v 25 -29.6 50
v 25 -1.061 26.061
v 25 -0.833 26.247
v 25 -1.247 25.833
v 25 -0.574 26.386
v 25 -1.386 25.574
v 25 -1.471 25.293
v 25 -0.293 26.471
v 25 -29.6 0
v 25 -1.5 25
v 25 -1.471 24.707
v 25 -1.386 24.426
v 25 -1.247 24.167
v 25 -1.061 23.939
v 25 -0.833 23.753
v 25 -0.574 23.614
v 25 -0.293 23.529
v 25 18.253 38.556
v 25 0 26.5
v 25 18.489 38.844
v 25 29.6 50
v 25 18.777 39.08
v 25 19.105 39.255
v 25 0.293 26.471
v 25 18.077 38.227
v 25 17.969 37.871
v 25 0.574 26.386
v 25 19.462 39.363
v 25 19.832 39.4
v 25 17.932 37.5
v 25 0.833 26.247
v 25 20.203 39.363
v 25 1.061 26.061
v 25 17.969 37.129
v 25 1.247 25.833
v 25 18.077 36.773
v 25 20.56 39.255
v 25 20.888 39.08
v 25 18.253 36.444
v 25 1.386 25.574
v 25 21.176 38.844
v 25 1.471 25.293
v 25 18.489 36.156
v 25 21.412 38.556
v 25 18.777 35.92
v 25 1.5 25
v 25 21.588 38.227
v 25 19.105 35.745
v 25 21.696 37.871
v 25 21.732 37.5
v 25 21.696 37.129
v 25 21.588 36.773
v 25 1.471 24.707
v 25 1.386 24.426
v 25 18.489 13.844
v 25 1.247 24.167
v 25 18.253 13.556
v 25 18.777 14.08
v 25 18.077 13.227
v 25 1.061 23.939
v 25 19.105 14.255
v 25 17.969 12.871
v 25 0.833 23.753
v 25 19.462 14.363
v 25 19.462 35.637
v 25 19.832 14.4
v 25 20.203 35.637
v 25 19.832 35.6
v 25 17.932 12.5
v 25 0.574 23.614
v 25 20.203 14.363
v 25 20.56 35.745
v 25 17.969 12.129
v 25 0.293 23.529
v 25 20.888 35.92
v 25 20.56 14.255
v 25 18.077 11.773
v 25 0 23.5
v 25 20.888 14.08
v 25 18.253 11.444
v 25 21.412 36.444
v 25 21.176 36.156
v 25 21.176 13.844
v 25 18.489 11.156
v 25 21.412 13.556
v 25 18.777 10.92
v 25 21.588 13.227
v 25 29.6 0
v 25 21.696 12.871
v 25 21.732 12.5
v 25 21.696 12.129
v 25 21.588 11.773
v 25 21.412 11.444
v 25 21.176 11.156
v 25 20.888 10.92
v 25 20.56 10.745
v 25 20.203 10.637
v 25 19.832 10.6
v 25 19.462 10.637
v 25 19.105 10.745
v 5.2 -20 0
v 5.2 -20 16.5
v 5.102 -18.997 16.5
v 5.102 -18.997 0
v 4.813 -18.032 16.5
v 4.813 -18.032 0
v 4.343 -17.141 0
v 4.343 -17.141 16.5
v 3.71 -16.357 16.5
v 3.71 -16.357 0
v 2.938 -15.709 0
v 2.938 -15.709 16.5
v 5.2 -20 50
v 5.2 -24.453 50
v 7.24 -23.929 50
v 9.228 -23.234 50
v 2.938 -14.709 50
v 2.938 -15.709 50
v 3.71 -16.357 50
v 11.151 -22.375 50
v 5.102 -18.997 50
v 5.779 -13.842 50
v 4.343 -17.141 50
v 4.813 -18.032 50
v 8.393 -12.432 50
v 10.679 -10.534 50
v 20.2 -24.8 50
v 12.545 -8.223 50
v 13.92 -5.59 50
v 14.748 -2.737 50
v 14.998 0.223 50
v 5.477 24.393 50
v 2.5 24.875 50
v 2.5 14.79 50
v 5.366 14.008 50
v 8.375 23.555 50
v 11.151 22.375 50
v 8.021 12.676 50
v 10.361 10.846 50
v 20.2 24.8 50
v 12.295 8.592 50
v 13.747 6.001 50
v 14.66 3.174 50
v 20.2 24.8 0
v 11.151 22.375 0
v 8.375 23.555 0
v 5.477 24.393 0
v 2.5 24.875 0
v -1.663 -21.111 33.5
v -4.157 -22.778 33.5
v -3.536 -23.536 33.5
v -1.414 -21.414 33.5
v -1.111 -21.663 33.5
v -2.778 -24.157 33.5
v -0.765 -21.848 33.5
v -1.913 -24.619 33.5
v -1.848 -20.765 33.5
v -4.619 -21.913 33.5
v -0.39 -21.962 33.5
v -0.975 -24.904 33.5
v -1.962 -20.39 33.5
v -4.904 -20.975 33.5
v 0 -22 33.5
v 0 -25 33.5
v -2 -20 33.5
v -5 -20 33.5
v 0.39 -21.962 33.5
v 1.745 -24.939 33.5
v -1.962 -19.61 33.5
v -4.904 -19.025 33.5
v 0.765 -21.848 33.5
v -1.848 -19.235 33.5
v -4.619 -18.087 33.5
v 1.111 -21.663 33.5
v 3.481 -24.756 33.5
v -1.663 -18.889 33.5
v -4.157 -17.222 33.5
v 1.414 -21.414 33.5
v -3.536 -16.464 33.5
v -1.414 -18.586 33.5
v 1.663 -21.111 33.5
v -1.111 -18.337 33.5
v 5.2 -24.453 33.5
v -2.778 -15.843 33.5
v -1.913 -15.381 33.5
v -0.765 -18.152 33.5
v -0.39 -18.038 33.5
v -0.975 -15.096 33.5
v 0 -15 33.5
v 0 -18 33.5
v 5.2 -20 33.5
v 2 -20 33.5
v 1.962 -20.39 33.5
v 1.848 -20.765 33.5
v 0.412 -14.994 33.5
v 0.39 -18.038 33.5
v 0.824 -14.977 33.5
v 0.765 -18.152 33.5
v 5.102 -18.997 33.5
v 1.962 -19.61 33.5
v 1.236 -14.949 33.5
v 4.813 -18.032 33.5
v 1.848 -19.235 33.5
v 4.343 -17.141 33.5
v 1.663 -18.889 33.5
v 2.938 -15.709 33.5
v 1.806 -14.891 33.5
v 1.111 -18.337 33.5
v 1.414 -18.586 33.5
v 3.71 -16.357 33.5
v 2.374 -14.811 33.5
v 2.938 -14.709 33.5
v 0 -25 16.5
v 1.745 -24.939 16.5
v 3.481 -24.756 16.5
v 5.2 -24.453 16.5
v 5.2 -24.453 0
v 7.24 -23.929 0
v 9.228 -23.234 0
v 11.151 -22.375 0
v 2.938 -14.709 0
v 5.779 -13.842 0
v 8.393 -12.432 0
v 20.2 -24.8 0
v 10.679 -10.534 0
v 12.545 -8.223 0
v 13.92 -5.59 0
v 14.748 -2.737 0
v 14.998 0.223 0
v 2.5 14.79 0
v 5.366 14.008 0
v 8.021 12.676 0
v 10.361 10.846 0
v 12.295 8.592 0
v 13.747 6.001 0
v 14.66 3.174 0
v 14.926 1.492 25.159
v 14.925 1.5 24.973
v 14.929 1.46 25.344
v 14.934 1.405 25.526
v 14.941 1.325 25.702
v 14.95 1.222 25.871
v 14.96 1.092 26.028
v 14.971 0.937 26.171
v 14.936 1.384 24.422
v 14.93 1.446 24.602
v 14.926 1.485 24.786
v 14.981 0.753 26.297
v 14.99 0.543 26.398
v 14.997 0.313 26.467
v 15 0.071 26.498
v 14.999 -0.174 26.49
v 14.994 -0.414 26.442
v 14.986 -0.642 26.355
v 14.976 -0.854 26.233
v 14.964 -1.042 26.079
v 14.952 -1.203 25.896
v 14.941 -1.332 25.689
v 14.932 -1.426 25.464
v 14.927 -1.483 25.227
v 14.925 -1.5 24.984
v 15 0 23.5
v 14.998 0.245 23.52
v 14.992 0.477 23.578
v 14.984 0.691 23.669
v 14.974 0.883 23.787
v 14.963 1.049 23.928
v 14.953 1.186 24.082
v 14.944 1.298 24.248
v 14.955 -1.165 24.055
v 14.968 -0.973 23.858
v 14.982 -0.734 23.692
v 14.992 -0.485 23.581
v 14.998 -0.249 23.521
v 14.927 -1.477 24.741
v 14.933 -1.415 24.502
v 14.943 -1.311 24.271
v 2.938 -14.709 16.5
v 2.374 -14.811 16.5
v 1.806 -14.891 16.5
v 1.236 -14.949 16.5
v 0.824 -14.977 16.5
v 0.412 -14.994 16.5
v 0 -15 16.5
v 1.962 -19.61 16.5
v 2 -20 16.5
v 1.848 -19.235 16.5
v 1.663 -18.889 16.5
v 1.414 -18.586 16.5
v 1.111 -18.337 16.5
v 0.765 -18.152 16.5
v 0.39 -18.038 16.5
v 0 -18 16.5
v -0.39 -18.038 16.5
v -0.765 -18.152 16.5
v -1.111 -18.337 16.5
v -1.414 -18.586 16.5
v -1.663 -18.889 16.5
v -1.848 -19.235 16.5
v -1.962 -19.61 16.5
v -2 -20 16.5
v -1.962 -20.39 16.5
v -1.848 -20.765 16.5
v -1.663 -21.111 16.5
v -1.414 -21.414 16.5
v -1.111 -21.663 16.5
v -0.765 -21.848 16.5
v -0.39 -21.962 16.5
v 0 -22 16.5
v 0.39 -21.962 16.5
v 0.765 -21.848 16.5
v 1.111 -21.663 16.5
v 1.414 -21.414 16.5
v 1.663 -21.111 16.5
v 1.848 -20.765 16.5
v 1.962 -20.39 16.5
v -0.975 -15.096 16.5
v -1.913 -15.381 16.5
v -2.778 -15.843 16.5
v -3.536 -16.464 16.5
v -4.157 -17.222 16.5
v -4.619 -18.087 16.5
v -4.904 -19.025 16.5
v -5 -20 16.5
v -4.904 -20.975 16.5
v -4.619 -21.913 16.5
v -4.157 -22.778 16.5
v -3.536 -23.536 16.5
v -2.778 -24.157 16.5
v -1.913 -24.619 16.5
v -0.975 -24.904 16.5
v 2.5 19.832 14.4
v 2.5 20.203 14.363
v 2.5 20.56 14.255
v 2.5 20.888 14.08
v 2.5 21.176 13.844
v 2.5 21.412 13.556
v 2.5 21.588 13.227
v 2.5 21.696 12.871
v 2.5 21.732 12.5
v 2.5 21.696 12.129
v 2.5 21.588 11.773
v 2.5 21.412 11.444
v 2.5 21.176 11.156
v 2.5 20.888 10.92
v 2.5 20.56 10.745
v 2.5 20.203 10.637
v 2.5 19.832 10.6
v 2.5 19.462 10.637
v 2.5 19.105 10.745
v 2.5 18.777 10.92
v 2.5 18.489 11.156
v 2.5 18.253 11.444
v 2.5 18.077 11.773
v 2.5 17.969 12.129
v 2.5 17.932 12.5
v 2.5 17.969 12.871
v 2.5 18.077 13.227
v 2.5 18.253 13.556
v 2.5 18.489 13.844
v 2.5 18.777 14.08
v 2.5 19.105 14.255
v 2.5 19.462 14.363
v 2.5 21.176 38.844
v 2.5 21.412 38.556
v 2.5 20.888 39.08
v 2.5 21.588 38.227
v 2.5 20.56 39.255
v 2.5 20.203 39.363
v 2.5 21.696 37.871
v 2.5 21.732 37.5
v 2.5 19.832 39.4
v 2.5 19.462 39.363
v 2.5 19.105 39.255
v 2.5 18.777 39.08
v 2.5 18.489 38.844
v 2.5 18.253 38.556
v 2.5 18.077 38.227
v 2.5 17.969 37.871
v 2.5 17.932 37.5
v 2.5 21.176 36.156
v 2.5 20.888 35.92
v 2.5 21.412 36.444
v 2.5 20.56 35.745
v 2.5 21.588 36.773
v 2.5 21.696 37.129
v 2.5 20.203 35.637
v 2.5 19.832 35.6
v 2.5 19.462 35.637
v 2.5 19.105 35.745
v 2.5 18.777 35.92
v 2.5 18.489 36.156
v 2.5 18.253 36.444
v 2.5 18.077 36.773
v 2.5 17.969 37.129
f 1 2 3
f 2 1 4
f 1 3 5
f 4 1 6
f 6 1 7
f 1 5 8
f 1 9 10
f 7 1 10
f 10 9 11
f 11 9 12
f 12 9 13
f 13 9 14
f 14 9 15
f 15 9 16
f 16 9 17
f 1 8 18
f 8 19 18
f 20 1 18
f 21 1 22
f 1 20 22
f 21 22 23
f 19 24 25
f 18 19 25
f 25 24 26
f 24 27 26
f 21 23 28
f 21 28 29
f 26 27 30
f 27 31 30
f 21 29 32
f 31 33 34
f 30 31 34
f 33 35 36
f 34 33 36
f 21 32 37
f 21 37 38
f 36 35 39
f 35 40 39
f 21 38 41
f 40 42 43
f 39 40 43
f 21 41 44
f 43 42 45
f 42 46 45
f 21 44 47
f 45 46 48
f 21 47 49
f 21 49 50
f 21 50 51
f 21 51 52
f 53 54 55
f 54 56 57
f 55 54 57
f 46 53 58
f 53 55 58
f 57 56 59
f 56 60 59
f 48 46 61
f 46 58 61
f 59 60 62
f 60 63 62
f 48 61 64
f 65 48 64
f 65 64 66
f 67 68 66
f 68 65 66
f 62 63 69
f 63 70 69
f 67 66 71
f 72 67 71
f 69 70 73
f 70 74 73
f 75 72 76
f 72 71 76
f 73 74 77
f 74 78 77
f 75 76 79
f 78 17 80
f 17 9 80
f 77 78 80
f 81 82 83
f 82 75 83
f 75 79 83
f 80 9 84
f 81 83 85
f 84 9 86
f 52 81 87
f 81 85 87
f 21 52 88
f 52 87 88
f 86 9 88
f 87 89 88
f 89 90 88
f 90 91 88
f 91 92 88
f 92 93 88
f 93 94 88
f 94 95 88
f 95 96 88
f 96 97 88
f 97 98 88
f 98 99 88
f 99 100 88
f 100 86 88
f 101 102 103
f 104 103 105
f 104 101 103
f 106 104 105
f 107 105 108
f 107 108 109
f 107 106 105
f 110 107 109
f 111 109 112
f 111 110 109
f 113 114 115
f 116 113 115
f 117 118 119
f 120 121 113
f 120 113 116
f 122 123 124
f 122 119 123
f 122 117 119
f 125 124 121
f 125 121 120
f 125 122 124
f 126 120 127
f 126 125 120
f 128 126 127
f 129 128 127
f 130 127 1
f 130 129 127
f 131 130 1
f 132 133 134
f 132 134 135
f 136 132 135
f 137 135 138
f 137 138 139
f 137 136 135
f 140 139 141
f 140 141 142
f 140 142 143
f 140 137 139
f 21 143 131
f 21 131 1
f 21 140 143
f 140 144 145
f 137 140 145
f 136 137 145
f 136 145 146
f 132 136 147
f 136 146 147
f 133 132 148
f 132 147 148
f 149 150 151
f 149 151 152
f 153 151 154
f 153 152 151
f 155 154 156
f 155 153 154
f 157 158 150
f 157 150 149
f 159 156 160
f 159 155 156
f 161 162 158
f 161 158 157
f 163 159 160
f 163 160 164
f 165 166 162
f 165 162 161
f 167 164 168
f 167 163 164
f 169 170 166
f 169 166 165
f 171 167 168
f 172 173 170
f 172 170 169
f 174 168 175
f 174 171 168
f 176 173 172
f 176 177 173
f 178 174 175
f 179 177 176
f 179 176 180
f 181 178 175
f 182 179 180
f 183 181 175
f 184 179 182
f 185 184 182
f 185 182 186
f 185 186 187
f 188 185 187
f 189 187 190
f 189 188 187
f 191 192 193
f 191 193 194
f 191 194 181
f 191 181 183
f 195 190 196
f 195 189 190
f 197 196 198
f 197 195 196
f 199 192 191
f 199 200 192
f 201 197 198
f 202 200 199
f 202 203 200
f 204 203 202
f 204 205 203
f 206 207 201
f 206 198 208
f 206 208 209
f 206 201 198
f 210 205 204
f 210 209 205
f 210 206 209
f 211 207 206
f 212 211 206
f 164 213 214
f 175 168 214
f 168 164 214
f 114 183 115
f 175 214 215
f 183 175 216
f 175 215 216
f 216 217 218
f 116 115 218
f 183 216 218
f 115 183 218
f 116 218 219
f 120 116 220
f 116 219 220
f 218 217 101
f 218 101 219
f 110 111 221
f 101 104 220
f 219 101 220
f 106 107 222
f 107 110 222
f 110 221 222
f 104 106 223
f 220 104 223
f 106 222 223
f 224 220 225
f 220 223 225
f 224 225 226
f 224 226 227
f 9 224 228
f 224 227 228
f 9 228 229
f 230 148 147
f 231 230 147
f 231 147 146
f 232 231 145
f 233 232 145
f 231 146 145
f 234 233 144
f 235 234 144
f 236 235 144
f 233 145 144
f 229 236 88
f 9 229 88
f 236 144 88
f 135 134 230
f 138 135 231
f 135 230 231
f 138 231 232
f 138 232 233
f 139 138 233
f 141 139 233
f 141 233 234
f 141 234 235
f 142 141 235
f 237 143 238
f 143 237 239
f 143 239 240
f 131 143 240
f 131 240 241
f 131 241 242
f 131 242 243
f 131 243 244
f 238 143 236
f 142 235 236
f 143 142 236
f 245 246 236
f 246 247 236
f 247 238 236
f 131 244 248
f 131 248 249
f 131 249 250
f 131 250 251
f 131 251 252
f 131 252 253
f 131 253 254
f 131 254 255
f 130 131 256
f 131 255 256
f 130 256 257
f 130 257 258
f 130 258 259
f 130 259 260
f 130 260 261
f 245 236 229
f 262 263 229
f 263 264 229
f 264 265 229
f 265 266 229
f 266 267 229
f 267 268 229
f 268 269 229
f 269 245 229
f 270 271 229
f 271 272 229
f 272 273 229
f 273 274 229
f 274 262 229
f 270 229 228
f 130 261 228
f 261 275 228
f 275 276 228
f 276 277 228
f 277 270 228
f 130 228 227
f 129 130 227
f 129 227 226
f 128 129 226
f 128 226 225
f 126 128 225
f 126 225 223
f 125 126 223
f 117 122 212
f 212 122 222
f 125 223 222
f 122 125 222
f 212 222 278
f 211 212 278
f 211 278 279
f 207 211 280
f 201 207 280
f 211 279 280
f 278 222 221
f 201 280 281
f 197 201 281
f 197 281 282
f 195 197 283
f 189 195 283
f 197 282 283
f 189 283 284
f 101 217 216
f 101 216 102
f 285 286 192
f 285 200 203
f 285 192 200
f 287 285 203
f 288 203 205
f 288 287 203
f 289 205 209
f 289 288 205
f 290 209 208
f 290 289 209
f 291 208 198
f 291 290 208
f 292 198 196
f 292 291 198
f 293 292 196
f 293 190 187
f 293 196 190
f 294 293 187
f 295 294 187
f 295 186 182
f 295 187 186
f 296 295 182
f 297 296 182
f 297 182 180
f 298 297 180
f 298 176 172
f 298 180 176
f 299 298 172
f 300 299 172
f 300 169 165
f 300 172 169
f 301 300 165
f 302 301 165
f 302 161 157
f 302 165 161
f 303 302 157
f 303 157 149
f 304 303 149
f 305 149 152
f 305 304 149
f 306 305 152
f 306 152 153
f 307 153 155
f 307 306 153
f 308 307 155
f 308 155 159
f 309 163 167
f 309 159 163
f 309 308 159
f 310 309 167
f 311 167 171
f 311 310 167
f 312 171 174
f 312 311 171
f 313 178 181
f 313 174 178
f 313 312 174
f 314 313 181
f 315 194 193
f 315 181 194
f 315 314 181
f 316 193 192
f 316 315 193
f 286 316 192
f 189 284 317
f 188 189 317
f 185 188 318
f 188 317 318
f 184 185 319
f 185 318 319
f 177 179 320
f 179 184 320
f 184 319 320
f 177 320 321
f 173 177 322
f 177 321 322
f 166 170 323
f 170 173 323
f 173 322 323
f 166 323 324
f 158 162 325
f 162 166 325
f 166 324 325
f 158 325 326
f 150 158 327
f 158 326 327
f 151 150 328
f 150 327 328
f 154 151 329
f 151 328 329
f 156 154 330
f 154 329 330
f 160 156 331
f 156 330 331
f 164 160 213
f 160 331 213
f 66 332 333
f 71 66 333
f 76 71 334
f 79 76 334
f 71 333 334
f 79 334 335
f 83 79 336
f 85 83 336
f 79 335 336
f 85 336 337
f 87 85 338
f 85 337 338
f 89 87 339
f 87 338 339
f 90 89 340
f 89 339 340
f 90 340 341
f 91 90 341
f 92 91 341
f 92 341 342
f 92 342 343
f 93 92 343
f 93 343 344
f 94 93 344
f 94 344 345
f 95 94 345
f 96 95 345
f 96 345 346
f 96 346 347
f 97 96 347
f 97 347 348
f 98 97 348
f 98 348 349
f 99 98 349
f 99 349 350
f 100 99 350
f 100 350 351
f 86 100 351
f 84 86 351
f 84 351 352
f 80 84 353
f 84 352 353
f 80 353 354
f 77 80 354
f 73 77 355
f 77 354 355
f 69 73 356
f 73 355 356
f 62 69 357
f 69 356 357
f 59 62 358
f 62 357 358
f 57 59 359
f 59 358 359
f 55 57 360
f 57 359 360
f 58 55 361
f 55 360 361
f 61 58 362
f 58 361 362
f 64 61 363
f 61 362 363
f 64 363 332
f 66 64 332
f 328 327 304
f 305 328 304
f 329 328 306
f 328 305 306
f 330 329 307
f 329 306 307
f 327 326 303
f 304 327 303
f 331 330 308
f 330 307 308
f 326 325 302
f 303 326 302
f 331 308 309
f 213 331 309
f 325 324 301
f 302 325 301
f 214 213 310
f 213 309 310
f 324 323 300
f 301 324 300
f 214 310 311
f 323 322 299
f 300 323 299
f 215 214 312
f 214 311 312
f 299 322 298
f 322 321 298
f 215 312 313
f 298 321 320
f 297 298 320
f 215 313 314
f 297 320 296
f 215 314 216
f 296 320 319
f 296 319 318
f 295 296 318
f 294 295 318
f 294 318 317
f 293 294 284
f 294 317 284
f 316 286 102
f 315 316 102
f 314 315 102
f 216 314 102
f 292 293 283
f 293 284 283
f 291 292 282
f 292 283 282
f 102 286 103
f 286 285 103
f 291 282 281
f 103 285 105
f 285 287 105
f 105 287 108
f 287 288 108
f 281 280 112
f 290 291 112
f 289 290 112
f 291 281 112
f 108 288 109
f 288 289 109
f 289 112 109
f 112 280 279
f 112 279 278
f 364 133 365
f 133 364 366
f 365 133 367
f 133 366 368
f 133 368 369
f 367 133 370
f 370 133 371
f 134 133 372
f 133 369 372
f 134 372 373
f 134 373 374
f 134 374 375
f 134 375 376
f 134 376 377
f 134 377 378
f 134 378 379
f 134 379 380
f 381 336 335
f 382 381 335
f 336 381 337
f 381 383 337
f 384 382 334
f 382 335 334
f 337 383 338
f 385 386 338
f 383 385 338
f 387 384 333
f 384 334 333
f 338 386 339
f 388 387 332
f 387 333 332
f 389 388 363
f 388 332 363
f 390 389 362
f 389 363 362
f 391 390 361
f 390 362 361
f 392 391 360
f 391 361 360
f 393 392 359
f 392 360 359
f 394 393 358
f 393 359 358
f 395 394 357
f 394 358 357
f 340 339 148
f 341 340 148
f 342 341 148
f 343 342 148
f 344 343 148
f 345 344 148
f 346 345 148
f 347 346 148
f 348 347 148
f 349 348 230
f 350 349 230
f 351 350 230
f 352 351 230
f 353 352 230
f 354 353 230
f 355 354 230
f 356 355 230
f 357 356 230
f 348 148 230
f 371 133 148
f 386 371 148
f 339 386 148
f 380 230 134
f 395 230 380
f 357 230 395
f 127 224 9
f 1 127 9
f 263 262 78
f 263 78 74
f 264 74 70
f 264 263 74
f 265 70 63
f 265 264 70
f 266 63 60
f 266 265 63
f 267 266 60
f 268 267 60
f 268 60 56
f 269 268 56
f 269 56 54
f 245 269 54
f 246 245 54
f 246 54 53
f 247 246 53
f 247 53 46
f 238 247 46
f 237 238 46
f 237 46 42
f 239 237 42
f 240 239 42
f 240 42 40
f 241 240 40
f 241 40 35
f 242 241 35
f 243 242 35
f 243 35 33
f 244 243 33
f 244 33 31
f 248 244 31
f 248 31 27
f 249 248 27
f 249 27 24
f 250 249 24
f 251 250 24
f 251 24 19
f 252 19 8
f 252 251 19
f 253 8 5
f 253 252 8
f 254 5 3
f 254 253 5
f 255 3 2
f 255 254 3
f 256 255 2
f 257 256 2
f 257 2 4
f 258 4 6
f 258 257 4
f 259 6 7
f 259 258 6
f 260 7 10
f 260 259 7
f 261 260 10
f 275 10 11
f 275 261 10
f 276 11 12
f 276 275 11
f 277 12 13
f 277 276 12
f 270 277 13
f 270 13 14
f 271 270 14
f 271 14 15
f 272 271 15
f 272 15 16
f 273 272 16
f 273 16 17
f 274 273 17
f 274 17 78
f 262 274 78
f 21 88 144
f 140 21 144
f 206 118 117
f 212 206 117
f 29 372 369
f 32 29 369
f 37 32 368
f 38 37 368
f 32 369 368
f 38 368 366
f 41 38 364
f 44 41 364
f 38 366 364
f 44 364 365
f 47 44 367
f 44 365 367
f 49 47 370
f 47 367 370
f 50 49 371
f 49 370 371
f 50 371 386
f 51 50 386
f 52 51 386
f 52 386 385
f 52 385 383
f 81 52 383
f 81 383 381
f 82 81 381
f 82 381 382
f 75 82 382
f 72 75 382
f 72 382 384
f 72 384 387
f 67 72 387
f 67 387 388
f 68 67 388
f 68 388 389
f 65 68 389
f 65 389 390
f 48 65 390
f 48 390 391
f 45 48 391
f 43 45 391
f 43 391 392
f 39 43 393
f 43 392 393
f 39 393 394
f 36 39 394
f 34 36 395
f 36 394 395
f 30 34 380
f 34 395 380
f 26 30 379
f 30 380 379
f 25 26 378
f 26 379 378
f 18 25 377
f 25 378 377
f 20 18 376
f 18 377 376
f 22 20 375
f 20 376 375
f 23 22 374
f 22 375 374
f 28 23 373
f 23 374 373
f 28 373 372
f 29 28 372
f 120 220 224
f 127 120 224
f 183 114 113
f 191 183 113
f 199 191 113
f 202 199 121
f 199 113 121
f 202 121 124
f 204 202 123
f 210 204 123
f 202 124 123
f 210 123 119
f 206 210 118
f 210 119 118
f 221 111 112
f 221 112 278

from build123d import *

# Parameters (mm, degrees)
SKETCH1_R           = 5
SKETCH1_R_2         = 2
BOSS_EXTRUDE1_DEPTH = 50
CUT_EXTRUDE13_DEPTH = 16.5
BOSS_EXTRUDE2_DEPTH = 50
SKETCH13_R          = 1.9
CUT_EXTRUDE12_DEPTH = 23.5
CUT_EXTRUDE14_DEPTH = 16.5
SKETCH20_R          = 1.5
CUT_EXTRUDE15_DEPTH = 26


with BuildPart() as part:
    # Sketch1 → Boss-Extrude1 (new body)
    with BuildSketch(Plane.XY):
        with Locations((0, -20)):
            Circle(SKETCH1_R)
        with Locations((0, -20)):
            Circle(SKETCH1_R_2, mode=Mode.SUBTRACT)
        with BuildLine():
            Line((2.5, 24.874685928), (2.5, 14.790199458))
            ThreePointArc((2.5, 14.790199458), (14.947457842, -1.254393904), (0, -15))
            ThreePointArc((0, -15), (3.535533906, -16.464466094), (5, -20))
            ThreePointArc((5, -20), (3.535533906, -23.535533906), (0, -25))
            ThreePointArc((0, -25), (24.968651828, -1.251569376), (2.5, 24.874685928))
        make_face()
    extrude(amount=BOSS_EXTRUDE1_DEPTH)

    # Sketch16 → Cut-Extrude13 (cut)
    with BuildSketch(Plane.XY.offset(50)):
        with BuildLine():
            Line((0, -25.2), (5.2, -25.2))
            Line((5.2, -25.2), (5.2, -20))
            ThreePointArc((5.2, -20), (-3.676955262, -16.323044738), (0, -25.2))
        make_face()
    cut_extrude13 = extrude(amount=-CUT_EXTRUDE13_DEPTH, mode=Mode.SUBTRACT)

    # Mirror2: Cut-Extrude13 across plane
    add(cut_extrude13.mirror(Plane(origin=(0, 0, 25), x_dir=(1, 0, 0), z_dir=(0, 0, -1))), mode=Mode.SUBTRACT)

    # Sketch17 → Boss-Extrude2 (add)
    with BuildSketch(Plane(origin=(0, 0, 0), x_dir=(-1, 0, 0), z_dir=(0, 0, -1))):
        Polygon((-20.2, 24.8), (-11.15099728, 22.375327029), (-20.2, 0), (-11.15099728, -22.375327029), (-20.2, -24.8), (-25, -29.6), (-25, 29.6), align=None)
    extrude(amount=-BOSS_EXTRUDE2_DEPTH)

    # Sketch13 → Cut-Extrude12 (cut, through all)
    with BuildSketch(Plane.ZY.offset(-2.5)):
        with Locations((37.5, 19.832442693)):
            Circle(SKETCH13_R)
        with Locations((12.5, 19.832442693)):
            Circle(SKETCH13_R)
    extrude(amount=-CUT_EXTRUDE12_DEPTH, mode=Mode.SUBTRACT)

    # Sketch19 → Cut-Extrude14 (cut)
    with BuildSketch(Plane.XY.offset(50)):
        with BuildLine():
            Line((2.937921703, -15.709473684), (2.937921703, -14.709473684))
            ThreePointArc((2.937921703, -14.709473684), (2.090334438, -14.853635984), (1.235879849, -14.949))
            ThreePointArc((1.235879849, -14.949), (2.121257859, -15.252341093), (2.937921703, -15.709473684))
        make_face()
    cut_extrude14 = extrude(amount=-CUT_EXTRUDE14_DEPTH, mode=Mode.SUBTRACT)

    # Mirror4: Cut-Extrude14 across plane
    add(cut_extrude14.mirror(Plane(origin=(0, 0, 25), x_dir=(1, 0, 0), z_dir=(0, 0, -1))), mode=Mode.SUBTRACT)

    # Sketch20 → Cut-Extrude15 (cut, through all)
    with BuildSketch(Plane(origin=(0, 0, 0), x_dir=(0, 0, -1), z_dir=(1, 0, 0))):
        with Locations((-25, 0)):
            Circle(SKETCH20_R)
    extrude(amount=CUT_EXTRUDE15_DEPTH, mode=Mode.SUBTRACT)


solid = part.part
